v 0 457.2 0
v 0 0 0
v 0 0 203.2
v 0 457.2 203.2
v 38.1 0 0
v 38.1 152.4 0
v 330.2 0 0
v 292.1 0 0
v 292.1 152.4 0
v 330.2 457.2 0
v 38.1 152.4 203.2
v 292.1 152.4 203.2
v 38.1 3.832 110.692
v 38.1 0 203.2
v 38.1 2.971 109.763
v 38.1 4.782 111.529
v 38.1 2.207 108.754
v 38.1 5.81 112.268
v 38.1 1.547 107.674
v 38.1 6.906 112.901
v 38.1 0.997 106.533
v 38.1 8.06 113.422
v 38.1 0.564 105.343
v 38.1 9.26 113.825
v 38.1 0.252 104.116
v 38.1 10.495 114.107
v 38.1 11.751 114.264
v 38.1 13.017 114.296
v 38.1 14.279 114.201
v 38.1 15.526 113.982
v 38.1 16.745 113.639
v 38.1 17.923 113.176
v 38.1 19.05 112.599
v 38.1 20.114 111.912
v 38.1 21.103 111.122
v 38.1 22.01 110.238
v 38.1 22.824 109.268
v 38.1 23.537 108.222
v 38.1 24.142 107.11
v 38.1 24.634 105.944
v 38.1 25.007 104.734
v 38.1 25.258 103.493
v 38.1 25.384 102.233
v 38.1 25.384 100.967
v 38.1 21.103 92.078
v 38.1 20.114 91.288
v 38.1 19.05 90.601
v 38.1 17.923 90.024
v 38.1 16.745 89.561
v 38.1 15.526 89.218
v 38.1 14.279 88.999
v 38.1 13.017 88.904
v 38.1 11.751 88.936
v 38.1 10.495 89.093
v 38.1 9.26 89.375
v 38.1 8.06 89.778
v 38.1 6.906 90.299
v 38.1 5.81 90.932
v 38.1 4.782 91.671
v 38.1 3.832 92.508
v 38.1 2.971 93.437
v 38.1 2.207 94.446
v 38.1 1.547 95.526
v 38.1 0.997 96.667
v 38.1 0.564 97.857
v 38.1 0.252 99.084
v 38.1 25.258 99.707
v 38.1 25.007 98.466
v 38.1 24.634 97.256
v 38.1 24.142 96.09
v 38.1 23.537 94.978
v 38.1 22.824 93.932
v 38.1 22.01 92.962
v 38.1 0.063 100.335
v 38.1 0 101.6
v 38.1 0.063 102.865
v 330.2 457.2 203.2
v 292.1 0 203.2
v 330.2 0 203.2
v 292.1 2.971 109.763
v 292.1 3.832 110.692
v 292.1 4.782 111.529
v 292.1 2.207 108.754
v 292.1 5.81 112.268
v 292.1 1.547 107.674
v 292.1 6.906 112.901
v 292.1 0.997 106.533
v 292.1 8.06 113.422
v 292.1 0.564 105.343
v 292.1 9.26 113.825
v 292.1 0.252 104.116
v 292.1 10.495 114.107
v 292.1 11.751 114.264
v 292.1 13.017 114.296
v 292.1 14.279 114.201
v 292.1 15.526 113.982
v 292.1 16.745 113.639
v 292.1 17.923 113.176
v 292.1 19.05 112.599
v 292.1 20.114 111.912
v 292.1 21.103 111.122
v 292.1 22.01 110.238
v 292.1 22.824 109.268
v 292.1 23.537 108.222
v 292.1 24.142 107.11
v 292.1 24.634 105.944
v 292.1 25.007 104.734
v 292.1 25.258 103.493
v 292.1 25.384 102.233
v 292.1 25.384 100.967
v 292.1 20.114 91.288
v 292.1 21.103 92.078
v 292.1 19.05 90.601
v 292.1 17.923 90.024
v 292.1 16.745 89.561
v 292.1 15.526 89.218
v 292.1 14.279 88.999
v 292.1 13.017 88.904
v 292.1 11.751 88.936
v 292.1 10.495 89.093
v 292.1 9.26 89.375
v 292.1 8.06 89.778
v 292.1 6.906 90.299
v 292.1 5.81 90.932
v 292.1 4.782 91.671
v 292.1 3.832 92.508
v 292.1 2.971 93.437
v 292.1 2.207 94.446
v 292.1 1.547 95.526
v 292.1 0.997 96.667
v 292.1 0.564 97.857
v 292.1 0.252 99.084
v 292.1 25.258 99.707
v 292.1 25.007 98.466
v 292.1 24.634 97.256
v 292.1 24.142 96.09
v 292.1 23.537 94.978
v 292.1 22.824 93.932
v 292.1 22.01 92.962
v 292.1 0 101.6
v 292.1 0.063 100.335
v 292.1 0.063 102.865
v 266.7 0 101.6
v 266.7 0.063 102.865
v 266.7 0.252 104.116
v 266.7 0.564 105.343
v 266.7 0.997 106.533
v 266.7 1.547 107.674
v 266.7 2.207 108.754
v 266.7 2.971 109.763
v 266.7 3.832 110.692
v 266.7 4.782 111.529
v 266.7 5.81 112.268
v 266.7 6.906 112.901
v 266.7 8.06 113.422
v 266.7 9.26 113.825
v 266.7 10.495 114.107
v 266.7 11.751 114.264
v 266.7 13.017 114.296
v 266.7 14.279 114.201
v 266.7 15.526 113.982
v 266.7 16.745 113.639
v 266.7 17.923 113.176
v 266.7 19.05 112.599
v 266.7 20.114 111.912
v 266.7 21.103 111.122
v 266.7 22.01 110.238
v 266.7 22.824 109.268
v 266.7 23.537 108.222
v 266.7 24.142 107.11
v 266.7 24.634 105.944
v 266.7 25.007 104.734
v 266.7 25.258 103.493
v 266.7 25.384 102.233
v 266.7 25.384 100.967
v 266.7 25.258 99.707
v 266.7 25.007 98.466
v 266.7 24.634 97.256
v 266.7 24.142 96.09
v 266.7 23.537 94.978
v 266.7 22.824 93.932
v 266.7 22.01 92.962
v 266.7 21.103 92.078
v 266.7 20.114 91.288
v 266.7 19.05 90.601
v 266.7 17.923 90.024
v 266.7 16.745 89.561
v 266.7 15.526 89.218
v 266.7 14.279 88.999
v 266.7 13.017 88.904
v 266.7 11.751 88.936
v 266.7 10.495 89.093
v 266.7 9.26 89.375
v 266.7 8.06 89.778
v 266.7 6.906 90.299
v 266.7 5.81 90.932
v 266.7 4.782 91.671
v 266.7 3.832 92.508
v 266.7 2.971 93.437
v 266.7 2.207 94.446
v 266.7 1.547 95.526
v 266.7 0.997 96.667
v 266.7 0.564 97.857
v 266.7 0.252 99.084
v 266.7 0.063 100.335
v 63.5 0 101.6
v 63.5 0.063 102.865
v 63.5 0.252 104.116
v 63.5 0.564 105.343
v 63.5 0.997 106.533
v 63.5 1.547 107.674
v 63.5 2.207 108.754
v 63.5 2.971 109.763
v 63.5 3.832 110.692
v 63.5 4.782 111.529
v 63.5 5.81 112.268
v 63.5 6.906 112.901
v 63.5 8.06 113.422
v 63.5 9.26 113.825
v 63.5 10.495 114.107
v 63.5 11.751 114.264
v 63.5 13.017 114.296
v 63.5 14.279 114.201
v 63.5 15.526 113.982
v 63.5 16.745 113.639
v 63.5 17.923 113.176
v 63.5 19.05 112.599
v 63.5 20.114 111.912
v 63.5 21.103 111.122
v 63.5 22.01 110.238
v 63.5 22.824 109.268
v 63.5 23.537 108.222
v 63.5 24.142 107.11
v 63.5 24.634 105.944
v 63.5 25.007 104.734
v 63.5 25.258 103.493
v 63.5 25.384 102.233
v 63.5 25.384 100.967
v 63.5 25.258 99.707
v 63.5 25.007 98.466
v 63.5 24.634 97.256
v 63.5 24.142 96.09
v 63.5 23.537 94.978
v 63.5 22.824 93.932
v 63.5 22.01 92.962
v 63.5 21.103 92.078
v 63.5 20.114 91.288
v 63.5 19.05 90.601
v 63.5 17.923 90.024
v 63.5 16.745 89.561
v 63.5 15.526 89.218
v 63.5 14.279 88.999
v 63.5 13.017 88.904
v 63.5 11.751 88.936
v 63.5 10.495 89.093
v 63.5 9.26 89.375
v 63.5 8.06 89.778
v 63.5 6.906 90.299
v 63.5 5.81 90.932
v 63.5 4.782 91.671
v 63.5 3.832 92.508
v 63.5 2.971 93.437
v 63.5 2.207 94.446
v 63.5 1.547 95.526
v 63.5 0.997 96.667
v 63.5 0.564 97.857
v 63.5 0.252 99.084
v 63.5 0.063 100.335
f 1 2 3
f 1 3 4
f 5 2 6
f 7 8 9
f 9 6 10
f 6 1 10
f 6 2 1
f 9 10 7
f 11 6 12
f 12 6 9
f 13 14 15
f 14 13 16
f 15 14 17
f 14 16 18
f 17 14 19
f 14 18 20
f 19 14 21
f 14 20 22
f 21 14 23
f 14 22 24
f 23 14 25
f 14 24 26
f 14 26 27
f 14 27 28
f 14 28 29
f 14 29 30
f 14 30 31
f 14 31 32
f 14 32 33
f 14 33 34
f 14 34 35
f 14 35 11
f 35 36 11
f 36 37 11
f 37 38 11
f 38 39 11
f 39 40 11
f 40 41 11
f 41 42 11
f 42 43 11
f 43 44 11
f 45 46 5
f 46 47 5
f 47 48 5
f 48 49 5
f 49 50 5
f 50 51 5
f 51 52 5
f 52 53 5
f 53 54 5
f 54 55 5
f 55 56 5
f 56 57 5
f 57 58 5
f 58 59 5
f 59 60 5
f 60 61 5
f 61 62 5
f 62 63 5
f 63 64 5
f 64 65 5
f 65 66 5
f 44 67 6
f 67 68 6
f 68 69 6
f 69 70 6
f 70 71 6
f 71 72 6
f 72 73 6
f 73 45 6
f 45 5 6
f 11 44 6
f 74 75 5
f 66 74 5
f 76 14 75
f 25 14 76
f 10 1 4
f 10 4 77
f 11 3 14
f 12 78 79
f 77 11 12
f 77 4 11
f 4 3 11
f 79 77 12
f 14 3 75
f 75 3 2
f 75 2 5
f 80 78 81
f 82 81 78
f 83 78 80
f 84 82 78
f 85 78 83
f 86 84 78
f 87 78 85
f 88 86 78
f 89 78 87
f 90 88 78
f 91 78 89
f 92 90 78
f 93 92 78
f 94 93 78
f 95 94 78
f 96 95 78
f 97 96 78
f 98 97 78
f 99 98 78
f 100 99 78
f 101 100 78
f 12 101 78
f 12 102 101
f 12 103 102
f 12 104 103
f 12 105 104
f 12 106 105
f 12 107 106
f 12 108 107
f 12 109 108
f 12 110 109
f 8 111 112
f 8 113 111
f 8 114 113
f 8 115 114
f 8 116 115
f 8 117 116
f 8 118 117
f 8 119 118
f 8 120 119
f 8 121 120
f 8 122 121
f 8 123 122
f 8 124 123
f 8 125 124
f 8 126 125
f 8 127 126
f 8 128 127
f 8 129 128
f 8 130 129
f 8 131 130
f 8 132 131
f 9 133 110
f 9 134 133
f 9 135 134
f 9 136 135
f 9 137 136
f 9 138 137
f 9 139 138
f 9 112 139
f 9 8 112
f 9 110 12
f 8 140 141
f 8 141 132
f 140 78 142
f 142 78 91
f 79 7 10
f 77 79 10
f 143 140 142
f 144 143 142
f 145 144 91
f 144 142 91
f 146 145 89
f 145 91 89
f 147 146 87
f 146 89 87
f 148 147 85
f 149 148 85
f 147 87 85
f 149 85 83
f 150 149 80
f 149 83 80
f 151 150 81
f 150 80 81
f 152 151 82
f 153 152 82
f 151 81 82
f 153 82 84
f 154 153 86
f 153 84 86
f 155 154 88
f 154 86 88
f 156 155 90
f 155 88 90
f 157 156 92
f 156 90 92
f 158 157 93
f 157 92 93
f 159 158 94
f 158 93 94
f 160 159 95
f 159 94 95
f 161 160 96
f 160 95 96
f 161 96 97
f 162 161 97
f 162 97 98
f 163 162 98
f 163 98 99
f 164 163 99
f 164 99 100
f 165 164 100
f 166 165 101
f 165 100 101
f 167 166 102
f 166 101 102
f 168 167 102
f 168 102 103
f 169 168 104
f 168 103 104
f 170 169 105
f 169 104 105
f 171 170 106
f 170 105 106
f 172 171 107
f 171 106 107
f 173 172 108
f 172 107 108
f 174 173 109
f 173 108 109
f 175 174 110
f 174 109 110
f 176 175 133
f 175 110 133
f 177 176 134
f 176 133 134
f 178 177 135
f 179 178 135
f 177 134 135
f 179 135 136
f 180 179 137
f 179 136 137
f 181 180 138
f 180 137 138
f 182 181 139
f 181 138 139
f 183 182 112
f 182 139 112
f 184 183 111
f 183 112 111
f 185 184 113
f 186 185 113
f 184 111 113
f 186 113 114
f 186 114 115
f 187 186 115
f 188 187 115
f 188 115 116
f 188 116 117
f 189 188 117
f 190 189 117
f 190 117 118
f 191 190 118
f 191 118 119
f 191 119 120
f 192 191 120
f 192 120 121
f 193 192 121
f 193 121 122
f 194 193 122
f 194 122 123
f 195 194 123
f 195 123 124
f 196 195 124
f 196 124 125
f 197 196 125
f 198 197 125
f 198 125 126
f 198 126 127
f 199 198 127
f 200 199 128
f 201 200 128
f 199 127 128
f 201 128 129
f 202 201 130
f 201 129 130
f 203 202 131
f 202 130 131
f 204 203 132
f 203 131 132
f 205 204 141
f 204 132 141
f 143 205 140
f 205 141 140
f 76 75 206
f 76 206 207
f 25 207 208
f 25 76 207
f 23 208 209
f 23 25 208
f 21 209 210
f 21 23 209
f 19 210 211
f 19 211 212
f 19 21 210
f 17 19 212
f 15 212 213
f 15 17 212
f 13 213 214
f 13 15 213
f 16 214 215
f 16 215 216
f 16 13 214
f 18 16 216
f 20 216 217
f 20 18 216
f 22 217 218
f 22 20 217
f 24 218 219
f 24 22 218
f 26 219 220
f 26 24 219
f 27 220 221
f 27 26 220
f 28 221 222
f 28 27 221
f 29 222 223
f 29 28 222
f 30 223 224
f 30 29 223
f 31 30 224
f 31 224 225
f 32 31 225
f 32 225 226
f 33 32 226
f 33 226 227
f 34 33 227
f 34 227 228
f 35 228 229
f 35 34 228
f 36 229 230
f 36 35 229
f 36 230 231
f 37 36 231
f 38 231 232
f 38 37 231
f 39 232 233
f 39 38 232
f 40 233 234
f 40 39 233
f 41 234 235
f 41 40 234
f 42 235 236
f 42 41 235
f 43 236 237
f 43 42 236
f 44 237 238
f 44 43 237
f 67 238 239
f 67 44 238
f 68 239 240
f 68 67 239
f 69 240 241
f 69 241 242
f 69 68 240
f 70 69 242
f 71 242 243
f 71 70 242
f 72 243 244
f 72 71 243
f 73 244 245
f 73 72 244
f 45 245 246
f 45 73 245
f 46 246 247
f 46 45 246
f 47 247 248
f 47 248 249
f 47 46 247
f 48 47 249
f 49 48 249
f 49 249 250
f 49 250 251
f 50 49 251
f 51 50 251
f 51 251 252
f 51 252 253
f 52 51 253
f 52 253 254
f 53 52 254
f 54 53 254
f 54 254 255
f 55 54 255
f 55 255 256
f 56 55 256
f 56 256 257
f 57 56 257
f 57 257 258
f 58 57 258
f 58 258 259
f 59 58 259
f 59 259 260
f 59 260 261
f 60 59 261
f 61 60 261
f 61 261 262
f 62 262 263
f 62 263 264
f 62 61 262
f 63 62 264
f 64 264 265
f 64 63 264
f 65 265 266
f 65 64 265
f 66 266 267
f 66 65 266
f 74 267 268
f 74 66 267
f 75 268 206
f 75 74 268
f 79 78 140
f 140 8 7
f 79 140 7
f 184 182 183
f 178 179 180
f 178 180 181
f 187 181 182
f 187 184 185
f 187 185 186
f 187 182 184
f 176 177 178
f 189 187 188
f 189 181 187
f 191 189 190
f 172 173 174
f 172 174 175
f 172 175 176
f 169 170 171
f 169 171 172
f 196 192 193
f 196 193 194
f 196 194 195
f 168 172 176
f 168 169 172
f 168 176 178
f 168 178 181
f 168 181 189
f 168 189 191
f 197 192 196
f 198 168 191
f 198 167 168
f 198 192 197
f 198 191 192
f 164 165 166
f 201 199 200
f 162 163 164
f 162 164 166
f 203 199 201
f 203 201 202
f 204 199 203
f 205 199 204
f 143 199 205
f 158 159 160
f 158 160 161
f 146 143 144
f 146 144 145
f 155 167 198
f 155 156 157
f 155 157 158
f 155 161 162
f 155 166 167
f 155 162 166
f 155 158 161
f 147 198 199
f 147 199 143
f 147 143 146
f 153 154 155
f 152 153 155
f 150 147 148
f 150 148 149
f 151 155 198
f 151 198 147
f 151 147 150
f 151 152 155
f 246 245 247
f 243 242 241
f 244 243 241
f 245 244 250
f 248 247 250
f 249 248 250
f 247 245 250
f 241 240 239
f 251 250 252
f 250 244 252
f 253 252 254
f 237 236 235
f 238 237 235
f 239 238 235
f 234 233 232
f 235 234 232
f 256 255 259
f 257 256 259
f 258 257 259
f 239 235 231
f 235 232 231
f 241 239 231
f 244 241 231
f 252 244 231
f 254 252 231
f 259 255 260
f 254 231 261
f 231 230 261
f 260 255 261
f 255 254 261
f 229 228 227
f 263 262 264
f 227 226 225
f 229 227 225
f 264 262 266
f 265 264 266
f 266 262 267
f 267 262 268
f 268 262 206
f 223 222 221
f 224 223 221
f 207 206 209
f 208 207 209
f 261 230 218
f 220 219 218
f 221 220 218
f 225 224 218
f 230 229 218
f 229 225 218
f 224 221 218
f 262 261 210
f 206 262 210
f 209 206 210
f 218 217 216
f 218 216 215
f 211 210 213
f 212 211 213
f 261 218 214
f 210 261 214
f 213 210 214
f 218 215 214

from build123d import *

# Parameters (mm, degrees)
SKETCH1_W               = 330.2
SKETCH1_H               = 457.2
BOSS_EXTRUDE1_DEPTH     = 203.2
CUT_EXTRUDE1_DEPTH      = 115.316
CUT_EXTRUDE1_DEPTH_BACK = 294.386
SKETCH2_W               = 254
SKETCH2_H               = 152.4
SKETCH3_R               = 12.7
BOSS_EXTRUDE2_DEPTH     = 25.4


with BuildPart() as part:
    # Sketch1 → Boss-Extrude1 (new body)
    with BuildSketch(Plane.XY):
        with Locations((165.1, 228.6)):
            Rectangle(SKETCH1_W, SKETCH1_H)
    extrude(amount=BOSS_EXTRUDE1_DEPTH)

    # Sketch2 → Cut-Extrude1 (cut, two sides: drawn at the far end of the back side and taken through both)
    with BuildSketch(Plane.XY.offset(203.2).offset(-CUT_EXTRUDE1_DEPTH_BACK)):
        with Locations((165.1, 76.2)):
            Rectangle(SKETCH2_W, SKETCH2_H)
    extrude(amount=CUT_EXTRUDE1_DEPTH + CUT_EXTRUDE1_DEPTH_BACK, mode=Mode.SUBTRACT)

    # Sketch3 → Boss-Extrude2 (add)
    with BuildSketch(Plane.ZY.offset(-292.1)):
        with Locations(Location((101.6, 12.7, 0), (0, 0, 270))):
            Circle(SKETCH3_R)
    boss_extrude2 = extrude(amount=BOSS_EXTRUDE2_DEPTH)

    # Mirror1: Boss-Extrude2 across plane
    add(boss_extrude2.mirror(Plane.ZY.offset(-165.1)))


solid = part.part
